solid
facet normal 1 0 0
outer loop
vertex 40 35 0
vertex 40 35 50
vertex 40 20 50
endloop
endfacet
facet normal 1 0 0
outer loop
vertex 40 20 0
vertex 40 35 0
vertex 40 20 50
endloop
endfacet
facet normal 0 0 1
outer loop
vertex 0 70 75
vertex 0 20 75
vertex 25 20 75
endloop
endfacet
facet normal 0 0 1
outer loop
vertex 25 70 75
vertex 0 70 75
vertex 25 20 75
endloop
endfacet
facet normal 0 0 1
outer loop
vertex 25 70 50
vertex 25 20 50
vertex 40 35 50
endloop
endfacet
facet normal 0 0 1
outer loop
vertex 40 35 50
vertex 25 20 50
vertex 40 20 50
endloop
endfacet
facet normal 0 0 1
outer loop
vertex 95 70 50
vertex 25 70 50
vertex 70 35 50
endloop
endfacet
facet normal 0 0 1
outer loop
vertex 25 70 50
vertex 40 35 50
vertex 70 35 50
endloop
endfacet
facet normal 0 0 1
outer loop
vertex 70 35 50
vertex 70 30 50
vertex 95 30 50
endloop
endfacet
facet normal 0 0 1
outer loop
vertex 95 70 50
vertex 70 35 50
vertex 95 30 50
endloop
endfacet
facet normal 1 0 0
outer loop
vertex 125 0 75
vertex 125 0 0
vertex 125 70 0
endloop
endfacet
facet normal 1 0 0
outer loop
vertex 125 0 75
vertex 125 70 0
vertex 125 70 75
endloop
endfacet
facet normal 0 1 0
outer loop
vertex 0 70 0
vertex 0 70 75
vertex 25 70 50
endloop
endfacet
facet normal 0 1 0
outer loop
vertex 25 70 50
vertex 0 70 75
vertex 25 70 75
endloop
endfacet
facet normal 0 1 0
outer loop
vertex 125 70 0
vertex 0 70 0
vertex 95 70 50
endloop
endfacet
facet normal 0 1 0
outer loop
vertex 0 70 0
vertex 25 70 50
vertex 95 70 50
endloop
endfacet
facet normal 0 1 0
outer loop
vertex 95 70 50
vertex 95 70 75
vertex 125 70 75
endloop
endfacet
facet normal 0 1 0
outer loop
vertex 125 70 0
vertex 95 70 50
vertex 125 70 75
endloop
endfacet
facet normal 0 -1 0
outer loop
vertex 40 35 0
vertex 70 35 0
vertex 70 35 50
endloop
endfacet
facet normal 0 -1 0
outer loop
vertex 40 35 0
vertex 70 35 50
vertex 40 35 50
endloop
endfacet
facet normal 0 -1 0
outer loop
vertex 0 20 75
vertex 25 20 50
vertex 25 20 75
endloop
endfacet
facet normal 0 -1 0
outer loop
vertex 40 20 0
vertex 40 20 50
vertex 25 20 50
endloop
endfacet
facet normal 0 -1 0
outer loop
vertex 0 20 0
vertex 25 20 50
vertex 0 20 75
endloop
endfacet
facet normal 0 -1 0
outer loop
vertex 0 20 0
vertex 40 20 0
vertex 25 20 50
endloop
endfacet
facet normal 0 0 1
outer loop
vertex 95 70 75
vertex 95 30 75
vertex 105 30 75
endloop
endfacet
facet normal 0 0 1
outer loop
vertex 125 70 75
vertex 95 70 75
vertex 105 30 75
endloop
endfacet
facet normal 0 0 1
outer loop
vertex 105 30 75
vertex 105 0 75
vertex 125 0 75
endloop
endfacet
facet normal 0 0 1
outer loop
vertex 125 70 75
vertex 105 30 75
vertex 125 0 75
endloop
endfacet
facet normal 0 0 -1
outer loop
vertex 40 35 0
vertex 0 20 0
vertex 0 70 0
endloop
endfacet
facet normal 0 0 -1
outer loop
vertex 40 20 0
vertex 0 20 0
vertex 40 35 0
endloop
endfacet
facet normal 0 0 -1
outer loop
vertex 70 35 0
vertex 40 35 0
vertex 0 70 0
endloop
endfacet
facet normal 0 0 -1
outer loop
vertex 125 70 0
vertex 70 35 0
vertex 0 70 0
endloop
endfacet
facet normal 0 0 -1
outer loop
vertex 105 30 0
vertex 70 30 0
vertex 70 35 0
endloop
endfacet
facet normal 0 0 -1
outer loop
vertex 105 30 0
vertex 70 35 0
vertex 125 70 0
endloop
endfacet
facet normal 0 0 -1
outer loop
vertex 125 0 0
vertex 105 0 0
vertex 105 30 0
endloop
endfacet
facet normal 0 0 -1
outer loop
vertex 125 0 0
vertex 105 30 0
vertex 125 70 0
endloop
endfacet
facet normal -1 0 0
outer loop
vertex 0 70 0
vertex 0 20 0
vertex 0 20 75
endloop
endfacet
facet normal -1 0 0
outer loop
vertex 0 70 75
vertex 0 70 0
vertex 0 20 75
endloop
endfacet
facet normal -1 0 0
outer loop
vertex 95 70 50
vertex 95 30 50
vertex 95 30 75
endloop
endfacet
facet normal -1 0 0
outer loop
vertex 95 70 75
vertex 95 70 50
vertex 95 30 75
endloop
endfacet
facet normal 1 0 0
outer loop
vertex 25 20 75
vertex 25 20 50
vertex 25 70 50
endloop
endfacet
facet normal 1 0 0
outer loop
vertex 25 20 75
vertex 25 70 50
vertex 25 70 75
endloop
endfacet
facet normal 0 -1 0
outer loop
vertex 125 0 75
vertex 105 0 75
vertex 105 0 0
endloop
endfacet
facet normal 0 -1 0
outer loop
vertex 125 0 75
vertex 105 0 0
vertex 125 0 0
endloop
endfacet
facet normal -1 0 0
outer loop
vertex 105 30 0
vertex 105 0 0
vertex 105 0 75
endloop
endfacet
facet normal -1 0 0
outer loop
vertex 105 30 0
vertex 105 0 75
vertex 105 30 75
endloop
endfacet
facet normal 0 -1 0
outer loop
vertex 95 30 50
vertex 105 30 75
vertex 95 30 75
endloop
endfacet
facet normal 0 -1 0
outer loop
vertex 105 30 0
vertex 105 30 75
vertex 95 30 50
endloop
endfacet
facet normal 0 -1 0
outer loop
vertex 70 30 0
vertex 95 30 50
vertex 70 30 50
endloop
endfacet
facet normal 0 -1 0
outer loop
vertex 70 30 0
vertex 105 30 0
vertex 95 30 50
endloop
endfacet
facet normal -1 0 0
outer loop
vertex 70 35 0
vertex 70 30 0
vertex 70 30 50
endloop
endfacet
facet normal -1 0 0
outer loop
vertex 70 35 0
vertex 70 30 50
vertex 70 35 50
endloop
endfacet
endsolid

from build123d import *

# Parameters (mm, degrees)
F0_W     = 125
F0_H     = 75
F1_DEPTH = 70
F2_W     = 70
F2_H     = 25
F3_DEPTH = 70.001
F5_DEPTH = 75.001


with BuildPart() as f1:
    # F0 (on Front) → F1 (new body)
    with BuildSketch(Plane.XZ):
        with Locations((62.5, 37.5)):
            Rectangle(F0_W, F0_H)
    extrude(amount=-F1_DEPTH)

    # F2 (on face) → F3 (cut, through all)
    with BuildSketch(Plane.XZ):
        with Locations((60, 62.5)):
            Rectangle(F2_W, F2_H)
    extrude(amount=-F3_DEPTH, mode=Mode.SUBTRACT)

    # F4 (on Top) → F5 (cut, through all)
    with BuildSketch(Plane.XY):
        Polygon((105, 0), (105, 30), (70, 30), (70, 35), (40, 35), (40, 20), (0, 20), (0, -31.133723), (125, -31.133723), (125, 0), align=None)
    extrude(amount=F5_DEPTH, mode=Mode.SUBTRACT)


solid = f1.part
